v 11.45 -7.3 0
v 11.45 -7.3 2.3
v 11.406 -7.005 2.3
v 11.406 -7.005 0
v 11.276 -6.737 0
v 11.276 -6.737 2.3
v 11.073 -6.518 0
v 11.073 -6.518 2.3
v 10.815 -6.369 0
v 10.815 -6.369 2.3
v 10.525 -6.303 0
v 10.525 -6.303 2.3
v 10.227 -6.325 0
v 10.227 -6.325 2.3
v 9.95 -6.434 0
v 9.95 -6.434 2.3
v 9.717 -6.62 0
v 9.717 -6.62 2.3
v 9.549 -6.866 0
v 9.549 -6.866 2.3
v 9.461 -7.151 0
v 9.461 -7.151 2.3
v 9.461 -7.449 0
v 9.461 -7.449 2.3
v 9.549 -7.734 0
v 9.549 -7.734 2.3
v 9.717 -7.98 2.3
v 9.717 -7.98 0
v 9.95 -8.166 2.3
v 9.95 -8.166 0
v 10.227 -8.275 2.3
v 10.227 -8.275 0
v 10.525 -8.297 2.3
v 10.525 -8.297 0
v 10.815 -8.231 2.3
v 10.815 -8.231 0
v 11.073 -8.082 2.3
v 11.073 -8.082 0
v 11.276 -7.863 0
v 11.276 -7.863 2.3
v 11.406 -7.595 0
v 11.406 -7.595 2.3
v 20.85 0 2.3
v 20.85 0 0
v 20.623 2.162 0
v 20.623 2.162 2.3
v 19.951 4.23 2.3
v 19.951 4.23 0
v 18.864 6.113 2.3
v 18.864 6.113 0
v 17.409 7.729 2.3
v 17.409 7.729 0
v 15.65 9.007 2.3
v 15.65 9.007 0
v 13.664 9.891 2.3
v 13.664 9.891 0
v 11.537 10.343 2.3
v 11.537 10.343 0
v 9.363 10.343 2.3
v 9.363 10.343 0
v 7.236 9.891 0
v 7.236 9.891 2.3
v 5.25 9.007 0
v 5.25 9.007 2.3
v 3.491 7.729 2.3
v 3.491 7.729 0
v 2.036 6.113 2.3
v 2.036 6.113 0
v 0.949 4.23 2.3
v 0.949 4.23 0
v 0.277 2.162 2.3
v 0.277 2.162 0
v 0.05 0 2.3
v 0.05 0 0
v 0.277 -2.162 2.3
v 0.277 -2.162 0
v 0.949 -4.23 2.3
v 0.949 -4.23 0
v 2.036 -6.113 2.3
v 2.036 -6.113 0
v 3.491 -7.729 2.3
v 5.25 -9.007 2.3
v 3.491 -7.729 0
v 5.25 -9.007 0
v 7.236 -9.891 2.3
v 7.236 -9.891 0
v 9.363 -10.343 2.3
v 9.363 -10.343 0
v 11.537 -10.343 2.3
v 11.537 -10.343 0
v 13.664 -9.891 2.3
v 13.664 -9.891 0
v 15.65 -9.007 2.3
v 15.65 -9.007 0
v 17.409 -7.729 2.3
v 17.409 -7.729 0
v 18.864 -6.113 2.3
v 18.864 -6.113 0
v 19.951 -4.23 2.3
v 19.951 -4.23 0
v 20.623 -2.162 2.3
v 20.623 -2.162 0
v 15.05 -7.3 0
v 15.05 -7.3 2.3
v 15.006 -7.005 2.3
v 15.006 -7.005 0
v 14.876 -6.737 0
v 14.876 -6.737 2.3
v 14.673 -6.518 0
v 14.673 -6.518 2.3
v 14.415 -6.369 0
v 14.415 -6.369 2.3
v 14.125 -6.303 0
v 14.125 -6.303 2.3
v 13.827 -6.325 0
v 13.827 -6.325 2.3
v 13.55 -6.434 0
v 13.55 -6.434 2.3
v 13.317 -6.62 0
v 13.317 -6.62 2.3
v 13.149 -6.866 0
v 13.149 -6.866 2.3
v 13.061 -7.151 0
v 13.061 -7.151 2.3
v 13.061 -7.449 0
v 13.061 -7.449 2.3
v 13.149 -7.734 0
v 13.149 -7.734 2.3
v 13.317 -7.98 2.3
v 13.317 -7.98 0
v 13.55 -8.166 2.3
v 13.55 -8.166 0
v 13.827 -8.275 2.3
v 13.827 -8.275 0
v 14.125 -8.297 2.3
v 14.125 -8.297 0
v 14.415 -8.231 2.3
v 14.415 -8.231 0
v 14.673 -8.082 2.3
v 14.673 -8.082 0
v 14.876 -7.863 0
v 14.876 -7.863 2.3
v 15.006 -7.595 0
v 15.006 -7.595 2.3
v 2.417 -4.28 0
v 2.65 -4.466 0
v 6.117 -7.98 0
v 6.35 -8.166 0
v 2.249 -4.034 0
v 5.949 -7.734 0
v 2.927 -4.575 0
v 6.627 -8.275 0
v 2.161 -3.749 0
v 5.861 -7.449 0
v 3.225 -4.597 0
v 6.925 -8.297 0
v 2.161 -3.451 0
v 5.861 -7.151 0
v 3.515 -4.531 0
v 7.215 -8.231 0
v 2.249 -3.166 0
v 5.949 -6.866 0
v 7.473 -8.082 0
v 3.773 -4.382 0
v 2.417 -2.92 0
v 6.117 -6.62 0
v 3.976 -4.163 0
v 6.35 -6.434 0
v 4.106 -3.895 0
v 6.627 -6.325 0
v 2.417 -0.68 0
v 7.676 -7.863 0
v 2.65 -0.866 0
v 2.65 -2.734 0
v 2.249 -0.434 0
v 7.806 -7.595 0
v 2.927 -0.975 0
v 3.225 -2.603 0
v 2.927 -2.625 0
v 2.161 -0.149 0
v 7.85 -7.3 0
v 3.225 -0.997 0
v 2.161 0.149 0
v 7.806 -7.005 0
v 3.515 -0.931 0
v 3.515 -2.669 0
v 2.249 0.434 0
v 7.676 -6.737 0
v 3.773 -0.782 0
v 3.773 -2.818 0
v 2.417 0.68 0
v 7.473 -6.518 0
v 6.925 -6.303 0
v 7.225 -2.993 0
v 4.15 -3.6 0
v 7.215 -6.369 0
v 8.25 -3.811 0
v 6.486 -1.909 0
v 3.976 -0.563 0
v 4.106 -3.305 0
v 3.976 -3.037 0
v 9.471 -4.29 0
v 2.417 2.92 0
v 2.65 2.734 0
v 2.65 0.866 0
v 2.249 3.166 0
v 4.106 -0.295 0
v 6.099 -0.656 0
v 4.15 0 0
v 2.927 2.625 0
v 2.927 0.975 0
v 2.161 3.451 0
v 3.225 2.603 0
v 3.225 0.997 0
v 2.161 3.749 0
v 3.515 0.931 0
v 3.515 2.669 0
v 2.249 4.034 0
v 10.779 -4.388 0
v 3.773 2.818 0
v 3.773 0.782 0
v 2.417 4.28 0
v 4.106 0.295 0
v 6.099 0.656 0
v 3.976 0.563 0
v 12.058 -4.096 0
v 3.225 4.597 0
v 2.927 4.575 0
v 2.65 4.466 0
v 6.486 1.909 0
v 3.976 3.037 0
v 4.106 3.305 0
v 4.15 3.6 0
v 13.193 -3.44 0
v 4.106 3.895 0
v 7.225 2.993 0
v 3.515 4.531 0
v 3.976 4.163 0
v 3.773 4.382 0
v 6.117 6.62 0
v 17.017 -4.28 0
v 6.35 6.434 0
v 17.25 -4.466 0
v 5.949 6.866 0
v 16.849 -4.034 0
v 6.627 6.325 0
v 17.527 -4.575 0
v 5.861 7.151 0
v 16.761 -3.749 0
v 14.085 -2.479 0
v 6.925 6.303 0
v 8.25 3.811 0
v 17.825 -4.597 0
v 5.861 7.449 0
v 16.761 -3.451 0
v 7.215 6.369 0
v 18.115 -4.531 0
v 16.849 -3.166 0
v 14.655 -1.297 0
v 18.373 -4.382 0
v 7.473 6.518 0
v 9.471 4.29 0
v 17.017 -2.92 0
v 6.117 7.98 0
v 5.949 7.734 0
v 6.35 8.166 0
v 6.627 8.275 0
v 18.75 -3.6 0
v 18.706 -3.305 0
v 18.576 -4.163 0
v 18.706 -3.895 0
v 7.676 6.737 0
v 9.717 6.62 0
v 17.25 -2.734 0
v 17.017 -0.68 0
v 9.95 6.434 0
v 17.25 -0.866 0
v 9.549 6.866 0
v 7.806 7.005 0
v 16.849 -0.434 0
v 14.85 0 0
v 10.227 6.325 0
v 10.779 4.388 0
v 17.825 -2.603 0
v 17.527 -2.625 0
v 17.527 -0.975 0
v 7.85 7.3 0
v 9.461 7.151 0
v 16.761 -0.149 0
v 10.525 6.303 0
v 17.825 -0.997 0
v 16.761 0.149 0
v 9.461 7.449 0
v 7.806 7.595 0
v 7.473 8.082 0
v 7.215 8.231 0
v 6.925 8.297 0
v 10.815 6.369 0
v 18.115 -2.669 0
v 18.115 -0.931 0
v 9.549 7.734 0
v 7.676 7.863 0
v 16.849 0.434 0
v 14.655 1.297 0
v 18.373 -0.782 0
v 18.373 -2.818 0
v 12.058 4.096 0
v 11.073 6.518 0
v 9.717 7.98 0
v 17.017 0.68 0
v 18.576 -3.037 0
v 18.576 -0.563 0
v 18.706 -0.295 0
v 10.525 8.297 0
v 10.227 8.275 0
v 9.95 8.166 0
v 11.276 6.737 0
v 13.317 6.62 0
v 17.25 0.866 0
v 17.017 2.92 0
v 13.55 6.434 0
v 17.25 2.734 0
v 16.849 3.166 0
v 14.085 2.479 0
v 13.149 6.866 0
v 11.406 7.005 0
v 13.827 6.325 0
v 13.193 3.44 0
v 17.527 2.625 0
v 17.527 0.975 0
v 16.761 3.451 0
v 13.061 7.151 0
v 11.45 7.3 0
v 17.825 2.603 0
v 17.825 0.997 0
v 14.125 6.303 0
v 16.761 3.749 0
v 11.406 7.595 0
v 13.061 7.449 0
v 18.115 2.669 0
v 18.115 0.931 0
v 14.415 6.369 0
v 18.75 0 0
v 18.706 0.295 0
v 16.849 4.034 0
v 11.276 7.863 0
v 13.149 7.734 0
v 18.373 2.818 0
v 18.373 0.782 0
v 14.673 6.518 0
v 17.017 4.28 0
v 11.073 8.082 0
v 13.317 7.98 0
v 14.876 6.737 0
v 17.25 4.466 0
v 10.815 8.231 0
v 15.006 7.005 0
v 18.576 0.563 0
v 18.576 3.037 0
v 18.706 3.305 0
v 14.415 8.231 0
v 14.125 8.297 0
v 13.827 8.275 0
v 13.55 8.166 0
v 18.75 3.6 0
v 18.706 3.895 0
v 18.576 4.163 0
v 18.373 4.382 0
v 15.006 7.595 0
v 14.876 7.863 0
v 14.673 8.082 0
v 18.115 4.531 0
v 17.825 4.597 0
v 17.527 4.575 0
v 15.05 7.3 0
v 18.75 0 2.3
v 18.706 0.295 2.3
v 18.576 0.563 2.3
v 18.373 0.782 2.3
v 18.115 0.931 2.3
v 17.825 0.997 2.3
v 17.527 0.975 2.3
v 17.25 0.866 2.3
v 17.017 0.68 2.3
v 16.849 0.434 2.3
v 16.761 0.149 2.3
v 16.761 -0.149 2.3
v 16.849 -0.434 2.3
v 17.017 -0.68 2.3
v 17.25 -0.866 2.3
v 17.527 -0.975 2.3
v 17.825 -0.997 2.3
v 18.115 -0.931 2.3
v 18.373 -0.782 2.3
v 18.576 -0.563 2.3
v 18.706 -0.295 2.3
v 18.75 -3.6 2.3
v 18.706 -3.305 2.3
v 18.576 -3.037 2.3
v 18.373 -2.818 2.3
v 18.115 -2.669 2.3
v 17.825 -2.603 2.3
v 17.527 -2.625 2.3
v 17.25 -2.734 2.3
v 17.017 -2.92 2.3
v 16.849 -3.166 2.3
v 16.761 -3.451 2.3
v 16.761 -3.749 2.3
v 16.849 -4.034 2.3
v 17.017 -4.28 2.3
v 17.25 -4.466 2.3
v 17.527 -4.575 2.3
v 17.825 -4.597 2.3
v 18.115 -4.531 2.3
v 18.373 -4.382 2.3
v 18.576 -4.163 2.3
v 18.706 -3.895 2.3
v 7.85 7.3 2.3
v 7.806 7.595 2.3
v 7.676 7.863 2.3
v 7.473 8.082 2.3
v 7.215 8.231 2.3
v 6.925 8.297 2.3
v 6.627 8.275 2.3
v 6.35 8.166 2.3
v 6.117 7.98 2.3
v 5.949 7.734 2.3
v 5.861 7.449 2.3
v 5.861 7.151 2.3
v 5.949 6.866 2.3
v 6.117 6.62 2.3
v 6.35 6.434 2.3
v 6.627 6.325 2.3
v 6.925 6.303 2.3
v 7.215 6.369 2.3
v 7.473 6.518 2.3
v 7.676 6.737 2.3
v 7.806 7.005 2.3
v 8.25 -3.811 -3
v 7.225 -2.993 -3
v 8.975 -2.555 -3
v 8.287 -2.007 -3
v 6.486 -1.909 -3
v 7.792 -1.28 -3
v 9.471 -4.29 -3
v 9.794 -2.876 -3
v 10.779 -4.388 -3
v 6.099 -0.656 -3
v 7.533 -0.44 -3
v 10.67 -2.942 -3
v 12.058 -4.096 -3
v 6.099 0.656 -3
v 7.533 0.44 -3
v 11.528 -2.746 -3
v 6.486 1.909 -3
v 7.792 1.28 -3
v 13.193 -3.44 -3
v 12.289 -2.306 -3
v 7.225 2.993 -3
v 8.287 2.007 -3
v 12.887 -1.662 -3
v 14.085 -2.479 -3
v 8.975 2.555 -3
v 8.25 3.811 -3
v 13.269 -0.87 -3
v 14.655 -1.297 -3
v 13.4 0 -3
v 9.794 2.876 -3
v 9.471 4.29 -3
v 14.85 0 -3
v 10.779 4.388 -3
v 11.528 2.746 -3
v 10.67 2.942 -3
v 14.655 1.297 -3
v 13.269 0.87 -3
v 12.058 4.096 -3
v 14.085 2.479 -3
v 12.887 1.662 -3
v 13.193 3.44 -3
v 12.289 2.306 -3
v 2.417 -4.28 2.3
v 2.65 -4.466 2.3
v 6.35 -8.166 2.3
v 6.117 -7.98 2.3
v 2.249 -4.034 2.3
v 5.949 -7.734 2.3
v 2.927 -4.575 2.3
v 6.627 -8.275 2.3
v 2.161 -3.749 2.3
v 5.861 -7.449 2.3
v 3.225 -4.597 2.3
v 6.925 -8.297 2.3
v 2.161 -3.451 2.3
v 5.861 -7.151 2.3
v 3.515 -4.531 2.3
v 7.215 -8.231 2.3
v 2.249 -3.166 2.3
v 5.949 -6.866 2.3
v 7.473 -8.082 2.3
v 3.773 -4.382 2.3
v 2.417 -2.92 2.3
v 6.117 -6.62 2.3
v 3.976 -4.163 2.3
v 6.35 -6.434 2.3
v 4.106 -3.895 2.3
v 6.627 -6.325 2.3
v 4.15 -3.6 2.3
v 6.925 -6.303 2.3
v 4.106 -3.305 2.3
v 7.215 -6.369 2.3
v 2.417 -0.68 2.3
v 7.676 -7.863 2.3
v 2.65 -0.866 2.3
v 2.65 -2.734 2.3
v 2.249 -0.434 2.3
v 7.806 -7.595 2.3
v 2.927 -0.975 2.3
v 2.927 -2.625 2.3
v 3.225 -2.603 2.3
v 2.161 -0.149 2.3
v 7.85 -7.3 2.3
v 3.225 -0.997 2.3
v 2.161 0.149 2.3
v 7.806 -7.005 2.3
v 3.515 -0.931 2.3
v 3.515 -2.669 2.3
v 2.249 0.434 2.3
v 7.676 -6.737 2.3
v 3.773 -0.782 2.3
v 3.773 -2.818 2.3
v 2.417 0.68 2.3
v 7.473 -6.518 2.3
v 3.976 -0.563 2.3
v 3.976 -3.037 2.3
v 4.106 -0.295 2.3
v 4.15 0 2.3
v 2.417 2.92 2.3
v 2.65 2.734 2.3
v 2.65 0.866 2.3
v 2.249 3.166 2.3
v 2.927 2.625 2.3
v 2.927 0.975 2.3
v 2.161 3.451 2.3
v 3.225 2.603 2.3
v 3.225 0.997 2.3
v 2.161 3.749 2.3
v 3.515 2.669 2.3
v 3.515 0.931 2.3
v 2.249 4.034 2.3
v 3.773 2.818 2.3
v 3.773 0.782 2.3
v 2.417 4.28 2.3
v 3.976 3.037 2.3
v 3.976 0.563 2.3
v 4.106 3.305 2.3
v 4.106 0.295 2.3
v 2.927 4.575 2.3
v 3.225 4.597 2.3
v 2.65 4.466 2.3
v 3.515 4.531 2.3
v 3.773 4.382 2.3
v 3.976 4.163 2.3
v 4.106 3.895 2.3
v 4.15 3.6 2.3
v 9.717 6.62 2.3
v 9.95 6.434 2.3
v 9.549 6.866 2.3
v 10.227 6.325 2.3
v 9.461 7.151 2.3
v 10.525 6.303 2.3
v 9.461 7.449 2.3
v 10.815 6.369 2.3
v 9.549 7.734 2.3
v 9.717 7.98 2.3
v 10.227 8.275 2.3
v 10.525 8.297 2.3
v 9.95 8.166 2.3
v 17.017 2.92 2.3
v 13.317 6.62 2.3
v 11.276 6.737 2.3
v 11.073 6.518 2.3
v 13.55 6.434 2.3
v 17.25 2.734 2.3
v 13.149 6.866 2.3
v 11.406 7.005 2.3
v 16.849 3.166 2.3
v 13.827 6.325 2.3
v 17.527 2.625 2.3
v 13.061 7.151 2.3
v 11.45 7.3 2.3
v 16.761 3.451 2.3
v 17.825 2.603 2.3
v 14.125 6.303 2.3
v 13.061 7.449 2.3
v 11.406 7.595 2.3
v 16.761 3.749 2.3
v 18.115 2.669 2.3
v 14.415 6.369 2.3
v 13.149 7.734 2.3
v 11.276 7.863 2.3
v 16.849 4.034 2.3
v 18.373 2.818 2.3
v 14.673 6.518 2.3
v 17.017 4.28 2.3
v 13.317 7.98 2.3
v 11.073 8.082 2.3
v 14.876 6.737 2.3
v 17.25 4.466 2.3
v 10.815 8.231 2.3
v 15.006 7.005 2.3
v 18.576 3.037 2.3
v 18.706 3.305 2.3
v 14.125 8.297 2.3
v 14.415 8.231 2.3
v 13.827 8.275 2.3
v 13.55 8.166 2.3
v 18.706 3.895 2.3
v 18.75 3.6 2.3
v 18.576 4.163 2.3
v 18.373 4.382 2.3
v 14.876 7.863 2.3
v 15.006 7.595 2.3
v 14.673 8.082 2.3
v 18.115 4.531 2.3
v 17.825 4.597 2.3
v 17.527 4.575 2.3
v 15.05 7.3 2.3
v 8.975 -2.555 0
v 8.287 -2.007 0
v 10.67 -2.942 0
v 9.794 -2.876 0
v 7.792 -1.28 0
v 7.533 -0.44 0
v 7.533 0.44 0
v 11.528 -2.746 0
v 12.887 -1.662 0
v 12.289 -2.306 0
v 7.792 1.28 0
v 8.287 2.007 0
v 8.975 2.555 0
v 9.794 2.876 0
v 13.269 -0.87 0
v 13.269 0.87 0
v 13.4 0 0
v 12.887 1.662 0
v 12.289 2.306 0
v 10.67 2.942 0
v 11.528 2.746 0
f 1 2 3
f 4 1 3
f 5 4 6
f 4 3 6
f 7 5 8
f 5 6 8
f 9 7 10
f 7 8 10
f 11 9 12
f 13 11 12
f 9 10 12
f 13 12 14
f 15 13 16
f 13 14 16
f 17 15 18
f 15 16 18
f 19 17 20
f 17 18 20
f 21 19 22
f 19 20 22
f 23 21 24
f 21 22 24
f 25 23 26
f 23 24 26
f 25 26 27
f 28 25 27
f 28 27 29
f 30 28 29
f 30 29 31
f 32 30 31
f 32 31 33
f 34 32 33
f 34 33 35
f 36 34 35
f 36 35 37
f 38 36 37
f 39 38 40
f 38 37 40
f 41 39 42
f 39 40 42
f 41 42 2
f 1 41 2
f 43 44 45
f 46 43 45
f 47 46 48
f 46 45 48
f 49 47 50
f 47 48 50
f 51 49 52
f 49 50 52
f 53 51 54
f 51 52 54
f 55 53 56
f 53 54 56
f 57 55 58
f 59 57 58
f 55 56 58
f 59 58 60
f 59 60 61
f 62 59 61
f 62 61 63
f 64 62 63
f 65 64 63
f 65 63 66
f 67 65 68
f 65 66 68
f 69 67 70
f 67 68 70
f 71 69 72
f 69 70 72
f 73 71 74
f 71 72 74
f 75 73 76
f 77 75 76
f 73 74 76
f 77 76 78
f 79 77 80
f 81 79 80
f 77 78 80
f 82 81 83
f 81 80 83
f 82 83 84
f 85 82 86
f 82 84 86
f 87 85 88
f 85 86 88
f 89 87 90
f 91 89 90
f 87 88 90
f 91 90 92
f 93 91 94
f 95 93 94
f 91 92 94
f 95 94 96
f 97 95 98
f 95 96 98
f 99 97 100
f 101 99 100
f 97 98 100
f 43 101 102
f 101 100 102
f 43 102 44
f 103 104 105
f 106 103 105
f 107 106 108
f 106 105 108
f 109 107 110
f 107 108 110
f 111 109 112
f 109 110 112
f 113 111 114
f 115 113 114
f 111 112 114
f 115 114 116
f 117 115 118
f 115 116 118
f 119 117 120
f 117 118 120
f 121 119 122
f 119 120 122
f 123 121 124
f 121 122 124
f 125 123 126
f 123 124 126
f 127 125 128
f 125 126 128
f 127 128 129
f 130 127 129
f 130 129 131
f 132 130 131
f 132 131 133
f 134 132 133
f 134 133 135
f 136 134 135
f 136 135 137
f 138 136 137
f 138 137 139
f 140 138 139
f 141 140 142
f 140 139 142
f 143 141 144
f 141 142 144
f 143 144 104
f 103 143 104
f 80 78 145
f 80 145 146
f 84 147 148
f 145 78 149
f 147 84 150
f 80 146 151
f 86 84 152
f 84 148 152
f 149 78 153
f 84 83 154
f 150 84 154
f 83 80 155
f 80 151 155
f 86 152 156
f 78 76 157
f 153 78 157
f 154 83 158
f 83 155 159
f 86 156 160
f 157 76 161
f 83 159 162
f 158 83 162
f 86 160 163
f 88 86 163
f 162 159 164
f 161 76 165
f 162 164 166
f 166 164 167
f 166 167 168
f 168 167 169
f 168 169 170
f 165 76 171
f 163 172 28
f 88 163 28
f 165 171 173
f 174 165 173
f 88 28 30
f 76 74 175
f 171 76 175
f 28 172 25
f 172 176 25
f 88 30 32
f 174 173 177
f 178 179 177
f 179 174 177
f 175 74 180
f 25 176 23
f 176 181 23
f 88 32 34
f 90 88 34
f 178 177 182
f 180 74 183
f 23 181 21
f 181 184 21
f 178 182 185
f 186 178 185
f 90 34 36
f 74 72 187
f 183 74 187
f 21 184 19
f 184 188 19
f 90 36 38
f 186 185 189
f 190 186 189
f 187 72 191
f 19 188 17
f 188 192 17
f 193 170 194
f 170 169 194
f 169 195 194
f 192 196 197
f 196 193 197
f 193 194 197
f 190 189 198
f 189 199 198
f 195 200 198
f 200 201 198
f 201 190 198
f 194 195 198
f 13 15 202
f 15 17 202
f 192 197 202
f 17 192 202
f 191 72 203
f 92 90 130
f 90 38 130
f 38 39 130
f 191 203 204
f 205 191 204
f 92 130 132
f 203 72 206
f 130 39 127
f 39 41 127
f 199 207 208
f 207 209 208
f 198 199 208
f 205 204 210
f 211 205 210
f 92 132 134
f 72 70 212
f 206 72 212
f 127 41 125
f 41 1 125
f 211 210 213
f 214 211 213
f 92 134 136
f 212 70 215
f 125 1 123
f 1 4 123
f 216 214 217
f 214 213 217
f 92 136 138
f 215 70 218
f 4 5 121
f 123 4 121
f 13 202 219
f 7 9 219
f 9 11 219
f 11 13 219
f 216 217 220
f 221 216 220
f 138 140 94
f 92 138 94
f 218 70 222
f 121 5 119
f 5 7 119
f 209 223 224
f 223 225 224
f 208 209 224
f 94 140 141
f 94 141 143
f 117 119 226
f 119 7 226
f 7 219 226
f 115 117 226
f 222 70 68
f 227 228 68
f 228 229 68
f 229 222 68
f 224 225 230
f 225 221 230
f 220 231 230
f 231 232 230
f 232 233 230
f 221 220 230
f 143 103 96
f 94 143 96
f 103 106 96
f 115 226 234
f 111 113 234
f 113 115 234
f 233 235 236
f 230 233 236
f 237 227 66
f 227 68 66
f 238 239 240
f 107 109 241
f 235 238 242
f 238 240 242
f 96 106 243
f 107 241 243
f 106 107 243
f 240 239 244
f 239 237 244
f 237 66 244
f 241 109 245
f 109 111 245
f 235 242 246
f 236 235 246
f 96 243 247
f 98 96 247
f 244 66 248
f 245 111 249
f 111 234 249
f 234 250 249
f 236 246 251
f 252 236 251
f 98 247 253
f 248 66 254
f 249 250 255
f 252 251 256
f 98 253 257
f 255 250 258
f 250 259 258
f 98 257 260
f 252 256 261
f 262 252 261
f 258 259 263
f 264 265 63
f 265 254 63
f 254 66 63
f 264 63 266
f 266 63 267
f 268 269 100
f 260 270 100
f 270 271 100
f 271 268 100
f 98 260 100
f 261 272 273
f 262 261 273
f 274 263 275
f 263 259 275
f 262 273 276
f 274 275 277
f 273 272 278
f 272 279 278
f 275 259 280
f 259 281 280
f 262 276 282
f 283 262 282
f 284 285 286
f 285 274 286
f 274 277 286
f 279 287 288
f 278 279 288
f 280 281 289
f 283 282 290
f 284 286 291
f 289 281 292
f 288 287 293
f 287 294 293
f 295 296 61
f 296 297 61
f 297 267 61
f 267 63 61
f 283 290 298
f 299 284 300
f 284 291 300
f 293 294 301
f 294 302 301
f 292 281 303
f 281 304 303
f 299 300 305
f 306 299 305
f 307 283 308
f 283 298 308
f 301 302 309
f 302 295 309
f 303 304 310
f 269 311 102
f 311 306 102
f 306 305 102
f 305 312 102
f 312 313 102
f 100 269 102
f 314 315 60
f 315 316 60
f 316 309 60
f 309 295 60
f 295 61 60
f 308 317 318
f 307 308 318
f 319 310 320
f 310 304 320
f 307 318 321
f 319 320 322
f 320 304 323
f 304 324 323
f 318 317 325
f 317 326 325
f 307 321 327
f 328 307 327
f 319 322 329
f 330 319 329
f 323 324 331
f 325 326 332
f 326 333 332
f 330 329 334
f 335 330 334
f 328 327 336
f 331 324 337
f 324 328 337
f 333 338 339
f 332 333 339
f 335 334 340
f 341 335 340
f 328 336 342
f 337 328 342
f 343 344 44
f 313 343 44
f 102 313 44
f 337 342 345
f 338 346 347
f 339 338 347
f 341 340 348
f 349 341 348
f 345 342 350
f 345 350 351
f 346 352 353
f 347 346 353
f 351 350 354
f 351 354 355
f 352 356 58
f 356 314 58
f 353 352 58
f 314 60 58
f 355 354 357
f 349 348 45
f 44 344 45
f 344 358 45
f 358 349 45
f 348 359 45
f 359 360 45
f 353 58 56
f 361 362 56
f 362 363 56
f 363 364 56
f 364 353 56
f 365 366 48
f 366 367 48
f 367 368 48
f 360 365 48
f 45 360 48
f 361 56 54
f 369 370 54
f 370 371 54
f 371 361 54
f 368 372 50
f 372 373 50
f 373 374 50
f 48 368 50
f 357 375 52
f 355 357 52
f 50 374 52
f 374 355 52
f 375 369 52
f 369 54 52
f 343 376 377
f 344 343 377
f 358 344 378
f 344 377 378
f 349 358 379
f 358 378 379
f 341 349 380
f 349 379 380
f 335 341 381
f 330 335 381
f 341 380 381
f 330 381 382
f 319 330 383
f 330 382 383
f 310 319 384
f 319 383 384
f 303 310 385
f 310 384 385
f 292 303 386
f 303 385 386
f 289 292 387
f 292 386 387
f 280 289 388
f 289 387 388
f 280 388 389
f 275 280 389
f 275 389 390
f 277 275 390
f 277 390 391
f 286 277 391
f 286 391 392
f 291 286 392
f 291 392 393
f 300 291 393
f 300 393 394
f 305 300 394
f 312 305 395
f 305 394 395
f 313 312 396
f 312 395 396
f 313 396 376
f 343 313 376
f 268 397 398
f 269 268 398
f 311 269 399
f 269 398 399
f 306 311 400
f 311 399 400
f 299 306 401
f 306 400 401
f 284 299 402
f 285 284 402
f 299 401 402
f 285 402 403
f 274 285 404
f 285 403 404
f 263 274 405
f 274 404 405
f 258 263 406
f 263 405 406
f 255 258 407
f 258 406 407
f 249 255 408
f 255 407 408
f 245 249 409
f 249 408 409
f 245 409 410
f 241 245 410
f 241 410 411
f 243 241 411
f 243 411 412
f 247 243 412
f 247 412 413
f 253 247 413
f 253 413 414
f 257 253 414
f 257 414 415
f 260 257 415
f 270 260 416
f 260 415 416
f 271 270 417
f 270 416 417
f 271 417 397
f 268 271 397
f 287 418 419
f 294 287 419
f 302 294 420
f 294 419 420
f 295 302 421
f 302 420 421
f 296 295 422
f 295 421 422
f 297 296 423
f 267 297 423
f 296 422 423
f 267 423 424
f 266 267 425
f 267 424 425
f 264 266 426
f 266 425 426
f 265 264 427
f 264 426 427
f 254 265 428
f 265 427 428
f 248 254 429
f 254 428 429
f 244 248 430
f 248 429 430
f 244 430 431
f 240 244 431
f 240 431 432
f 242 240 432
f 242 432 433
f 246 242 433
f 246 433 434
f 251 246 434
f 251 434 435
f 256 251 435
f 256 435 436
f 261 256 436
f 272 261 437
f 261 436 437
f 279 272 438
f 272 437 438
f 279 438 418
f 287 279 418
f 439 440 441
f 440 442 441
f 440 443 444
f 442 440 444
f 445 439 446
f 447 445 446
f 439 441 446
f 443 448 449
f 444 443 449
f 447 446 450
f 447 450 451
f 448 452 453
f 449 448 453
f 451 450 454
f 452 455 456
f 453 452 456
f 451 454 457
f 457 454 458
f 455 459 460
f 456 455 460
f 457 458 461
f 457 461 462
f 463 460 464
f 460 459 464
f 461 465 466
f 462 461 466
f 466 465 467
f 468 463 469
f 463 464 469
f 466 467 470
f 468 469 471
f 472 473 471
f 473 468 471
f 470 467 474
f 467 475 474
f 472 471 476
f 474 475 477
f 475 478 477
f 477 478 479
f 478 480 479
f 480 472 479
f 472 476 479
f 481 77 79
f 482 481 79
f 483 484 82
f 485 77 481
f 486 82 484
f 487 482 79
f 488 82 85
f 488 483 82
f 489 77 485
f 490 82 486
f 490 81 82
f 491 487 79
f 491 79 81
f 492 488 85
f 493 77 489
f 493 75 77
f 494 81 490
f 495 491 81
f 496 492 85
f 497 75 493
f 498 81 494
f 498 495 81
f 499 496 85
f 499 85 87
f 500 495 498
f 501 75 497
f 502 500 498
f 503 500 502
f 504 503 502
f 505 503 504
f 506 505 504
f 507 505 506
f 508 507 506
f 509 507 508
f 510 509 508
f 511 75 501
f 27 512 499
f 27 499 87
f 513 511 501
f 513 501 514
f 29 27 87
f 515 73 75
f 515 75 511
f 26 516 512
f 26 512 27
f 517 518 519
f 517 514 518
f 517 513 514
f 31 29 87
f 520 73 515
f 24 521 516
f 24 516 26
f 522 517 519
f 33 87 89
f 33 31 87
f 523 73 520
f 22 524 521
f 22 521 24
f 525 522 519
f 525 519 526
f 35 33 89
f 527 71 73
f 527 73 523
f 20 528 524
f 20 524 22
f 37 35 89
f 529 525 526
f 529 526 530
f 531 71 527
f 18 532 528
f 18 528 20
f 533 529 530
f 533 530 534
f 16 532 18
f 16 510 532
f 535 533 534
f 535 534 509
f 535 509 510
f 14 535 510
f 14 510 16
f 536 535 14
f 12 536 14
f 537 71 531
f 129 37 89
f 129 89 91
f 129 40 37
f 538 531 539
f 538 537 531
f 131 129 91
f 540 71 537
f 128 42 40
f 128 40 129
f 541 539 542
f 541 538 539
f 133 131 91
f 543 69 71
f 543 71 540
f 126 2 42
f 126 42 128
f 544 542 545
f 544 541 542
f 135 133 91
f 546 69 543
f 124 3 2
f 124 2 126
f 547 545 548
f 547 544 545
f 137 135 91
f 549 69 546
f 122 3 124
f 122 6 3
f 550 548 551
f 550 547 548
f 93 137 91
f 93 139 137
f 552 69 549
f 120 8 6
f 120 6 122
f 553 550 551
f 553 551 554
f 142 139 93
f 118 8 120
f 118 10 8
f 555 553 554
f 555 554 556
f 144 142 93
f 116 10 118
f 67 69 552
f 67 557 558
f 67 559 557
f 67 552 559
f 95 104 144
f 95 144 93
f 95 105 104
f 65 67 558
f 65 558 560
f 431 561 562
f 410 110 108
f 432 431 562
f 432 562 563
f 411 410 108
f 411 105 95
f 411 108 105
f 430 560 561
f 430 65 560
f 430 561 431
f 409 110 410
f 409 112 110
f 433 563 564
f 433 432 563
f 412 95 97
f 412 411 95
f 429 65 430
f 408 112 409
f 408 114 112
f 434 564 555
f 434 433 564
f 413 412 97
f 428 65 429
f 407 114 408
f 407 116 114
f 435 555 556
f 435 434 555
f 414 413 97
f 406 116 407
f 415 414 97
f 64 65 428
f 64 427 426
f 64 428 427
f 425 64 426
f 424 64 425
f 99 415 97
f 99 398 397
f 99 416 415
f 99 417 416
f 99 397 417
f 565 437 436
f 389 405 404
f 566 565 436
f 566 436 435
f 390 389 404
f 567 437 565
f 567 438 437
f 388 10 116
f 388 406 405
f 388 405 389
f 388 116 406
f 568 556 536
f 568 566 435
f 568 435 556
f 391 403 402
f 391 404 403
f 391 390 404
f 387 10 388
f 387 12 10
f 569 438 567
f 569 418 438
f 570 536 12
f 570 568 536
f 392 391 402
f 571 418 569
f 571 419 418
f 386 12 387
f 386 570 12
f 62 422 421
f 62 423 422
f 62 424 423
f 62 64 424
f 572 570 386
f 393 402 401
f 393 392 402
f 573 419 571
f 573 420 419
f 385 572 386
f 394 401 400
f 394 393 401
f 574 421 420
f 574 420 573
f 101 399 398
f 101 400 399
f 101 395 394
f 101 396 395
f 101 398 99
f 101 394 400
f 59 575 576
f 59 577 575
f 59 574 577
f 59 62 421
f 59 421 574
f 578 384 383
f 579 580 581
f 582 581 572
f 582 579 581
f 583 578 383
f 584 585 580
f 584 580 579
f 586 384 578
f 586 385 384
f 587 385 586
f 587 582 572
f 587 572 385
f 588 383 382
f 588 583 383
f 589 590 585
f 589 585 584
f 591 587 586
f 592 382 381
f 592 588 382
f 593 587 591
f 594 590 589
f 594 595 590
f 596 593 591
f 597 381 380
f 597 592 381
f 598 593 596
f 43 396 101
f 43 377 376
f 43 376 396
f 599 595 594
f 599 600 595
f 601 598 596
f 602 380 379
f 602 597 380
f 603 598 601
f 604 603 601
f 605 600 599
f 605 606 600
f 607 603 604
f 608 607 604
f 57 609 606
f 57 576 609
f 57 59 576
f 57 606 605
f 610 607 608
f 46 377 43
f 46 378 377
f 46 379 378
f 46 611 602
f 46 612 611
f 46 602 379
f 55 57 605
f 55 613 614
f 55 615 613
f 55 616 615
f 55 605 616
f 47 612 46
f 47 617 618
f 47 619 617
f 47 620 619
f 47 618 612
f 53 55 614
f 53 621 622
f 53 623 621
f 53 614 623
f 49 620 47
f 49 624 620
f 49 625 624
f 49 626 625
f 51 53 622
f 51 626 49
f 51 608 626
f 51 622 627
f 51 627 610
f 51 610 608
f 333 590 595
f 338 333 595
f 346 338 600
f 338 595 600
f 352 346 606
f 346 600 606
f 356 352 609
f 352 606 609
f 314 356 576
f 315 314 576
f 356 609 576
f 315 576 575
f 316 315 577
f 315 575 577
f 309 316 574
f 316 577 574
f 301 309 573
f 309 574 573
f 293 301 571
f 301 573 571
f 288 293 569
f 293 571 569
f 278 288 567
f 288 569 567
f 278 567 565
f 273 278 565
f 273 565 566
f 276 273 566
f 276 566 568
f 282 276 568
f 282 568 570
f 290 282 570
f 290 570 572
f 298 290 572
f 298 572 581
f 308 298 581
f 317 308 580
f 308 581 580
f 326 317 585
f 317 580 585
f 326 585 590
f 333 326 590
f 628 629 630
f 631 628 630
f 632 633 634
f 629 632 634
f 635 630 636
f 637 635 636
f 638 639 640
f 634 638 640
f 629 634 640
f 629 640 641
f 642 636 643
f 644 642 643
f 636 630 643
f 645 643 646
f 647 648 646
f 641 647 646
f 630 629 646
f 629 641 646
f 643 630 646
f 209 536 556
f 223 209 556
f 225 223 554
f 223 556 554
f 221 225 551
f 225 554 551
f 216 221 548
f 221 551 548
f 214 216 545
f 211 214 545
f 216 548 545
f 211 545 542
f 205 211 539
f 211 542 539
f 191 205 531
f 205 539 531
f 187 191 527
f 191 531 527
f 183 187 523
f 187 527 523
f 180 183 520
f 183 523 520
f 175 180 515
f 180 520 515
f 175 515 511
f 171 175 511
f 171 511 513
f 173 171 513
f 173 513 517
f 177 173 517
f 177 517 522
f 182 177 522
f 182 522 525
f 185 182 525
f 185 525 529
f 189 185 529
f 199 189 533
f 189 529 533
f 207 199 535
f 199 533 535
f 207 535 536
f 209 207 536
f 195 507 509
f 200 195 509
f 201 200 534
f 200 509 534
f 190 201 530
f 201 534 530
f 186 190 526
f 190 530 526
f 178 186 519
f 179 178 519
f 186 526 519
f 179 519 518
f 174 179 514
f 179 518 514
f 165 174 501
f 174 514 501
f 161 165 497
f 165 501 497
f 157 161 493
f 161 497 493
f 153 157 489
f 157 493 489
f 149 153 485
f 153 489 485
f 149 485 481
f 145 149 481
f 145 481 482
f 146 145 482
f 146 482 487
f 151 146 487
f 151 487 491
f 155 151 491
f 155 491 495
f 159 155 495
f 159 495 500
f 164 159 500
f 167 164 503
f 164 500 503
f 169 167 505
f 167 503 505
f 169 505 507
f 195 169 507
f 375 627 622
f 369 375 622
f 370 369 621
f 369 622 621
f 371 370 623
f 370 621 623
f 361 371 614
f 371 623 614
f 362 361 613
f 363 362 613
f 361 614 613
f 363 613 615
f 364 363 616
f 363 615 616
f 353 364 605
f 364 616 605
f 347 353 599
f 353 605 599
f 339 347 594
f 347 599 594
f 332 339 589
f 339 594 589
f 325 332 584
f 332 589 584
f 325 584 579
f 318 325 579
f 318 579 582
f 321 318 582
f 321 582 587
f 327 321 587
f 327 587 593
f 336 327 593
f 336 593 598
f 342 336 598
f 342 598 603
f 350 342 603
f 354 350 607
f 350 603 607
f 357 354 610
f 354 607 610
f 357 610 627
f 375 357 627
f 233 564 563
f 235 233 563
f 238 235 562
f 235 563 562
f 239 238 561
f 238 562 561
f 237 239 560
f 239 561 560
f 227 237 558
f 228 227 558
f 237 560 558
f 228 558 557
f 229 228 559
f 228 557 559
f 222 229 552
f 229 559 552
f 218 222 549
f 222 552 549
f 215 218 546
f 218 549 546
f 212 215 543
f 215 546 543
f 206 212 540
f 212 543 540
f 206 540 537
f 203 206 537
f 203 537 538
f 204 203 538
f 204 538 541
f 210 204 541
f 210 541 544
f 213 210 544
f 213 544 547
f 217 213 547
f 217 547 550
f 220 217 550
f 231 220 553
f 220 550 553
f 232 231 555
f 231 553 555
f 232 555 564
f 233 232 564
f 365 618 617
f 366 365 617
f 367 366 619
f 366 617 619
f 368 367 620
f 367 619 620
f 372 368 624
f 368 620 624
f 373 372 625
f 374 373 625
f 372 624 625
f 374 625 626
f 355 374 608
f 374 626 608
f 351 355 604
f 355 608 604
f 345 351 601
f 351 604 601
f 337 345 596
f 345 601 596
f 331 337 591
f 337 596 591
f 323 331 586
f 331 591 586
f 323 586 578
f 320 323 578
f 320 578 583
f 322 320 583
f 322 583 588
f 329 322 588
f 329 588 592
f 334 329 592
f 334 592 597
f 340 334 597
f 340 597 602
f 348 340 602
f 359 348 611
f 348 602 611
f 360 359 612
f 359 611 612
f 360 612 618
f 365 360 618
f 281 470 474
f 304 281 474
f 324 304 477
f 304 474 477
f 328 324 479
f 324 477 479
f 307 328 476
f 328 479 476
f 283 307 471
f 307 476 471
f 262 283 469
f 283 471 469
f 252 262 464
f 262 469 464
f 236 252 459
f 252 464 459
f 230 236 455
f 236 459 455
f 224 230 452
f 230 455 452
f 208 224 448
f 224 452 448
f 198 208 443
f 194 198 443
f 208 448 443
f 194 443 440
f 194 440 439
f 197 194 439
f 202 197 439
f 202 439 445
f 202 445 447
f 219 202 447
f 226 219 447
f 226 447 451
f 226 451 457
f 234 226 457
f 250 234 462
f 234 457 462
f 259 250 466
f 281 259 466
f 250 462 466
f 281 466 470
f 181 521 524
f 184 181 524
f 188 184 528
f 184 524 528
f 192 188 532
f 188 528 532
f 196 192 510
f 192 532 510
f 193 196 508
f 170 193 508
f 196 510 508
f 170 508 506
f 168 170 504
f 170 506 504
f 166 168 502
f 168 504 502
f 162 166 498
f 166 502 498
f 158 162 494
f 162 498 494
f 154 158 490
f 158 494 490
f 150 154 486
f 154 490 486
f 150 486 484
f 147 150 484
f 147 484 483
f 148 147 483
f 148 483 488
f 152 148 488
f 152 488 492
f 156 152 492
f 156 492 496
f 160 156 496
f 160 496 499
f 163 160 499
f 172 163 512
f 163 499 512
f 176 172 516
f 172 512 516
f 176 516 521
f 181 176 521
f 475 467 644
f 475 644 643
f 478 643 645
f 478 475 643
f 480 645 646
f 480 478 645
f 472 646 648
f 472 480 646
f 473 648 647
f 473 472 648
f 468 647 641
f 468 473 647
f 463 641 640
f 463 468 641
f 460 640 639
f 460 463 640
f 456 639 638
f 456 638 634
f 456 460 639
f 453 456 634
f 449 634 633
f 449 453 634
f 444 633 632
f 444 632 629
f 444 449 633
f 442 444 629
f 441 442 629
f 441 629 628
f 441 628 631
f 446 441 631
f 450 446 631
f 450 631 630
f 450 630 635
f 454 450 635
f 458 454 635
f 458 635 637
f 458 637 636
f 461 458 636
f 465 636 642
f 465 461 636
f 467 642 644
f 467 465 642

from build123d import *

# Parameters (mm, degrees)
EXTRUDE_START       = 1
SKETCH_2_R          = 4.4
SKETCH_2_R_2        = 2.95
EXTRUDE_2_DEPTH     = 3
SKETCH_3_R          = 10.4
EXTRUDE_3_DEPTH     = 2.3
SKETCH_5_R          = 1
CUT_EXTRUDE_1_DEPTH = 2.3


with BuildPart() as part:
    # 스케치2 → 보스-돌출2 (new body)
    with BuildSketch(Plane.XY.offset(-4).offset(EXTRUDE_START)):
        with Locations((10.45, 0)):
            Circle(SKETCH_2_R)
        with Locations((10.45, 0)):
            Circle(SKETCH_2_R_2, mode=Mode.SUBTRACT)
    extrude(amount=EXTRUDE_2_DEPTH)

    # 스케치3 → 보스-돌출3 (add)
    with BuildSketch(Plane.XY):
        with Locations((10.45, 0)):
            Circle(SKETCH_3_R)
    extrude(amount=EXTRUDE_3_DEPTH)

    # 스케치5 → 컷-돌출1 (cut)
    with BuildSketch(Plane.XY.offset(2.3)):
        with Locations((10.45, 7.3)):
            Circle(SKETCH_5_R)
        with Locations((14.05, 7.3)):
            Circle(SKETCH_5_R)
        with Locations((6.85, 7.3)):
            Circle(SKETCH_5_R)
        with Locations((3.15, 0)):
            Circle(SKETCH_5_R)
        with Locations((3.15, 3.6)):
            Circle(SKETCH_5_R)
        with Locations((3.15, -3.6)):
            Circle(SKETCH_5_R)
        with Locations((10.45, -7.3)):
            Circle(SKETCH_5_R)
        with Locations((6.85, -7.3)):
            Circle(SKETCH_5_R)
        with Locations((14.05, -7.3)):
            Circle(SKETCH_5_R)
        with Locations((17.75, 0)):
            Circle(SKETCH_5_R)
        with Locations((17.75, -3.6)):
            Circle(SKETCH_5_R)
        with Locations((17.75, 3.6)):
            Circle(SKETCH_5_R)
    extrude(amount=-CUT_EXTRUDE_1_DEPTH, mode=Mode.SUBTRACT)


solid = part.part
